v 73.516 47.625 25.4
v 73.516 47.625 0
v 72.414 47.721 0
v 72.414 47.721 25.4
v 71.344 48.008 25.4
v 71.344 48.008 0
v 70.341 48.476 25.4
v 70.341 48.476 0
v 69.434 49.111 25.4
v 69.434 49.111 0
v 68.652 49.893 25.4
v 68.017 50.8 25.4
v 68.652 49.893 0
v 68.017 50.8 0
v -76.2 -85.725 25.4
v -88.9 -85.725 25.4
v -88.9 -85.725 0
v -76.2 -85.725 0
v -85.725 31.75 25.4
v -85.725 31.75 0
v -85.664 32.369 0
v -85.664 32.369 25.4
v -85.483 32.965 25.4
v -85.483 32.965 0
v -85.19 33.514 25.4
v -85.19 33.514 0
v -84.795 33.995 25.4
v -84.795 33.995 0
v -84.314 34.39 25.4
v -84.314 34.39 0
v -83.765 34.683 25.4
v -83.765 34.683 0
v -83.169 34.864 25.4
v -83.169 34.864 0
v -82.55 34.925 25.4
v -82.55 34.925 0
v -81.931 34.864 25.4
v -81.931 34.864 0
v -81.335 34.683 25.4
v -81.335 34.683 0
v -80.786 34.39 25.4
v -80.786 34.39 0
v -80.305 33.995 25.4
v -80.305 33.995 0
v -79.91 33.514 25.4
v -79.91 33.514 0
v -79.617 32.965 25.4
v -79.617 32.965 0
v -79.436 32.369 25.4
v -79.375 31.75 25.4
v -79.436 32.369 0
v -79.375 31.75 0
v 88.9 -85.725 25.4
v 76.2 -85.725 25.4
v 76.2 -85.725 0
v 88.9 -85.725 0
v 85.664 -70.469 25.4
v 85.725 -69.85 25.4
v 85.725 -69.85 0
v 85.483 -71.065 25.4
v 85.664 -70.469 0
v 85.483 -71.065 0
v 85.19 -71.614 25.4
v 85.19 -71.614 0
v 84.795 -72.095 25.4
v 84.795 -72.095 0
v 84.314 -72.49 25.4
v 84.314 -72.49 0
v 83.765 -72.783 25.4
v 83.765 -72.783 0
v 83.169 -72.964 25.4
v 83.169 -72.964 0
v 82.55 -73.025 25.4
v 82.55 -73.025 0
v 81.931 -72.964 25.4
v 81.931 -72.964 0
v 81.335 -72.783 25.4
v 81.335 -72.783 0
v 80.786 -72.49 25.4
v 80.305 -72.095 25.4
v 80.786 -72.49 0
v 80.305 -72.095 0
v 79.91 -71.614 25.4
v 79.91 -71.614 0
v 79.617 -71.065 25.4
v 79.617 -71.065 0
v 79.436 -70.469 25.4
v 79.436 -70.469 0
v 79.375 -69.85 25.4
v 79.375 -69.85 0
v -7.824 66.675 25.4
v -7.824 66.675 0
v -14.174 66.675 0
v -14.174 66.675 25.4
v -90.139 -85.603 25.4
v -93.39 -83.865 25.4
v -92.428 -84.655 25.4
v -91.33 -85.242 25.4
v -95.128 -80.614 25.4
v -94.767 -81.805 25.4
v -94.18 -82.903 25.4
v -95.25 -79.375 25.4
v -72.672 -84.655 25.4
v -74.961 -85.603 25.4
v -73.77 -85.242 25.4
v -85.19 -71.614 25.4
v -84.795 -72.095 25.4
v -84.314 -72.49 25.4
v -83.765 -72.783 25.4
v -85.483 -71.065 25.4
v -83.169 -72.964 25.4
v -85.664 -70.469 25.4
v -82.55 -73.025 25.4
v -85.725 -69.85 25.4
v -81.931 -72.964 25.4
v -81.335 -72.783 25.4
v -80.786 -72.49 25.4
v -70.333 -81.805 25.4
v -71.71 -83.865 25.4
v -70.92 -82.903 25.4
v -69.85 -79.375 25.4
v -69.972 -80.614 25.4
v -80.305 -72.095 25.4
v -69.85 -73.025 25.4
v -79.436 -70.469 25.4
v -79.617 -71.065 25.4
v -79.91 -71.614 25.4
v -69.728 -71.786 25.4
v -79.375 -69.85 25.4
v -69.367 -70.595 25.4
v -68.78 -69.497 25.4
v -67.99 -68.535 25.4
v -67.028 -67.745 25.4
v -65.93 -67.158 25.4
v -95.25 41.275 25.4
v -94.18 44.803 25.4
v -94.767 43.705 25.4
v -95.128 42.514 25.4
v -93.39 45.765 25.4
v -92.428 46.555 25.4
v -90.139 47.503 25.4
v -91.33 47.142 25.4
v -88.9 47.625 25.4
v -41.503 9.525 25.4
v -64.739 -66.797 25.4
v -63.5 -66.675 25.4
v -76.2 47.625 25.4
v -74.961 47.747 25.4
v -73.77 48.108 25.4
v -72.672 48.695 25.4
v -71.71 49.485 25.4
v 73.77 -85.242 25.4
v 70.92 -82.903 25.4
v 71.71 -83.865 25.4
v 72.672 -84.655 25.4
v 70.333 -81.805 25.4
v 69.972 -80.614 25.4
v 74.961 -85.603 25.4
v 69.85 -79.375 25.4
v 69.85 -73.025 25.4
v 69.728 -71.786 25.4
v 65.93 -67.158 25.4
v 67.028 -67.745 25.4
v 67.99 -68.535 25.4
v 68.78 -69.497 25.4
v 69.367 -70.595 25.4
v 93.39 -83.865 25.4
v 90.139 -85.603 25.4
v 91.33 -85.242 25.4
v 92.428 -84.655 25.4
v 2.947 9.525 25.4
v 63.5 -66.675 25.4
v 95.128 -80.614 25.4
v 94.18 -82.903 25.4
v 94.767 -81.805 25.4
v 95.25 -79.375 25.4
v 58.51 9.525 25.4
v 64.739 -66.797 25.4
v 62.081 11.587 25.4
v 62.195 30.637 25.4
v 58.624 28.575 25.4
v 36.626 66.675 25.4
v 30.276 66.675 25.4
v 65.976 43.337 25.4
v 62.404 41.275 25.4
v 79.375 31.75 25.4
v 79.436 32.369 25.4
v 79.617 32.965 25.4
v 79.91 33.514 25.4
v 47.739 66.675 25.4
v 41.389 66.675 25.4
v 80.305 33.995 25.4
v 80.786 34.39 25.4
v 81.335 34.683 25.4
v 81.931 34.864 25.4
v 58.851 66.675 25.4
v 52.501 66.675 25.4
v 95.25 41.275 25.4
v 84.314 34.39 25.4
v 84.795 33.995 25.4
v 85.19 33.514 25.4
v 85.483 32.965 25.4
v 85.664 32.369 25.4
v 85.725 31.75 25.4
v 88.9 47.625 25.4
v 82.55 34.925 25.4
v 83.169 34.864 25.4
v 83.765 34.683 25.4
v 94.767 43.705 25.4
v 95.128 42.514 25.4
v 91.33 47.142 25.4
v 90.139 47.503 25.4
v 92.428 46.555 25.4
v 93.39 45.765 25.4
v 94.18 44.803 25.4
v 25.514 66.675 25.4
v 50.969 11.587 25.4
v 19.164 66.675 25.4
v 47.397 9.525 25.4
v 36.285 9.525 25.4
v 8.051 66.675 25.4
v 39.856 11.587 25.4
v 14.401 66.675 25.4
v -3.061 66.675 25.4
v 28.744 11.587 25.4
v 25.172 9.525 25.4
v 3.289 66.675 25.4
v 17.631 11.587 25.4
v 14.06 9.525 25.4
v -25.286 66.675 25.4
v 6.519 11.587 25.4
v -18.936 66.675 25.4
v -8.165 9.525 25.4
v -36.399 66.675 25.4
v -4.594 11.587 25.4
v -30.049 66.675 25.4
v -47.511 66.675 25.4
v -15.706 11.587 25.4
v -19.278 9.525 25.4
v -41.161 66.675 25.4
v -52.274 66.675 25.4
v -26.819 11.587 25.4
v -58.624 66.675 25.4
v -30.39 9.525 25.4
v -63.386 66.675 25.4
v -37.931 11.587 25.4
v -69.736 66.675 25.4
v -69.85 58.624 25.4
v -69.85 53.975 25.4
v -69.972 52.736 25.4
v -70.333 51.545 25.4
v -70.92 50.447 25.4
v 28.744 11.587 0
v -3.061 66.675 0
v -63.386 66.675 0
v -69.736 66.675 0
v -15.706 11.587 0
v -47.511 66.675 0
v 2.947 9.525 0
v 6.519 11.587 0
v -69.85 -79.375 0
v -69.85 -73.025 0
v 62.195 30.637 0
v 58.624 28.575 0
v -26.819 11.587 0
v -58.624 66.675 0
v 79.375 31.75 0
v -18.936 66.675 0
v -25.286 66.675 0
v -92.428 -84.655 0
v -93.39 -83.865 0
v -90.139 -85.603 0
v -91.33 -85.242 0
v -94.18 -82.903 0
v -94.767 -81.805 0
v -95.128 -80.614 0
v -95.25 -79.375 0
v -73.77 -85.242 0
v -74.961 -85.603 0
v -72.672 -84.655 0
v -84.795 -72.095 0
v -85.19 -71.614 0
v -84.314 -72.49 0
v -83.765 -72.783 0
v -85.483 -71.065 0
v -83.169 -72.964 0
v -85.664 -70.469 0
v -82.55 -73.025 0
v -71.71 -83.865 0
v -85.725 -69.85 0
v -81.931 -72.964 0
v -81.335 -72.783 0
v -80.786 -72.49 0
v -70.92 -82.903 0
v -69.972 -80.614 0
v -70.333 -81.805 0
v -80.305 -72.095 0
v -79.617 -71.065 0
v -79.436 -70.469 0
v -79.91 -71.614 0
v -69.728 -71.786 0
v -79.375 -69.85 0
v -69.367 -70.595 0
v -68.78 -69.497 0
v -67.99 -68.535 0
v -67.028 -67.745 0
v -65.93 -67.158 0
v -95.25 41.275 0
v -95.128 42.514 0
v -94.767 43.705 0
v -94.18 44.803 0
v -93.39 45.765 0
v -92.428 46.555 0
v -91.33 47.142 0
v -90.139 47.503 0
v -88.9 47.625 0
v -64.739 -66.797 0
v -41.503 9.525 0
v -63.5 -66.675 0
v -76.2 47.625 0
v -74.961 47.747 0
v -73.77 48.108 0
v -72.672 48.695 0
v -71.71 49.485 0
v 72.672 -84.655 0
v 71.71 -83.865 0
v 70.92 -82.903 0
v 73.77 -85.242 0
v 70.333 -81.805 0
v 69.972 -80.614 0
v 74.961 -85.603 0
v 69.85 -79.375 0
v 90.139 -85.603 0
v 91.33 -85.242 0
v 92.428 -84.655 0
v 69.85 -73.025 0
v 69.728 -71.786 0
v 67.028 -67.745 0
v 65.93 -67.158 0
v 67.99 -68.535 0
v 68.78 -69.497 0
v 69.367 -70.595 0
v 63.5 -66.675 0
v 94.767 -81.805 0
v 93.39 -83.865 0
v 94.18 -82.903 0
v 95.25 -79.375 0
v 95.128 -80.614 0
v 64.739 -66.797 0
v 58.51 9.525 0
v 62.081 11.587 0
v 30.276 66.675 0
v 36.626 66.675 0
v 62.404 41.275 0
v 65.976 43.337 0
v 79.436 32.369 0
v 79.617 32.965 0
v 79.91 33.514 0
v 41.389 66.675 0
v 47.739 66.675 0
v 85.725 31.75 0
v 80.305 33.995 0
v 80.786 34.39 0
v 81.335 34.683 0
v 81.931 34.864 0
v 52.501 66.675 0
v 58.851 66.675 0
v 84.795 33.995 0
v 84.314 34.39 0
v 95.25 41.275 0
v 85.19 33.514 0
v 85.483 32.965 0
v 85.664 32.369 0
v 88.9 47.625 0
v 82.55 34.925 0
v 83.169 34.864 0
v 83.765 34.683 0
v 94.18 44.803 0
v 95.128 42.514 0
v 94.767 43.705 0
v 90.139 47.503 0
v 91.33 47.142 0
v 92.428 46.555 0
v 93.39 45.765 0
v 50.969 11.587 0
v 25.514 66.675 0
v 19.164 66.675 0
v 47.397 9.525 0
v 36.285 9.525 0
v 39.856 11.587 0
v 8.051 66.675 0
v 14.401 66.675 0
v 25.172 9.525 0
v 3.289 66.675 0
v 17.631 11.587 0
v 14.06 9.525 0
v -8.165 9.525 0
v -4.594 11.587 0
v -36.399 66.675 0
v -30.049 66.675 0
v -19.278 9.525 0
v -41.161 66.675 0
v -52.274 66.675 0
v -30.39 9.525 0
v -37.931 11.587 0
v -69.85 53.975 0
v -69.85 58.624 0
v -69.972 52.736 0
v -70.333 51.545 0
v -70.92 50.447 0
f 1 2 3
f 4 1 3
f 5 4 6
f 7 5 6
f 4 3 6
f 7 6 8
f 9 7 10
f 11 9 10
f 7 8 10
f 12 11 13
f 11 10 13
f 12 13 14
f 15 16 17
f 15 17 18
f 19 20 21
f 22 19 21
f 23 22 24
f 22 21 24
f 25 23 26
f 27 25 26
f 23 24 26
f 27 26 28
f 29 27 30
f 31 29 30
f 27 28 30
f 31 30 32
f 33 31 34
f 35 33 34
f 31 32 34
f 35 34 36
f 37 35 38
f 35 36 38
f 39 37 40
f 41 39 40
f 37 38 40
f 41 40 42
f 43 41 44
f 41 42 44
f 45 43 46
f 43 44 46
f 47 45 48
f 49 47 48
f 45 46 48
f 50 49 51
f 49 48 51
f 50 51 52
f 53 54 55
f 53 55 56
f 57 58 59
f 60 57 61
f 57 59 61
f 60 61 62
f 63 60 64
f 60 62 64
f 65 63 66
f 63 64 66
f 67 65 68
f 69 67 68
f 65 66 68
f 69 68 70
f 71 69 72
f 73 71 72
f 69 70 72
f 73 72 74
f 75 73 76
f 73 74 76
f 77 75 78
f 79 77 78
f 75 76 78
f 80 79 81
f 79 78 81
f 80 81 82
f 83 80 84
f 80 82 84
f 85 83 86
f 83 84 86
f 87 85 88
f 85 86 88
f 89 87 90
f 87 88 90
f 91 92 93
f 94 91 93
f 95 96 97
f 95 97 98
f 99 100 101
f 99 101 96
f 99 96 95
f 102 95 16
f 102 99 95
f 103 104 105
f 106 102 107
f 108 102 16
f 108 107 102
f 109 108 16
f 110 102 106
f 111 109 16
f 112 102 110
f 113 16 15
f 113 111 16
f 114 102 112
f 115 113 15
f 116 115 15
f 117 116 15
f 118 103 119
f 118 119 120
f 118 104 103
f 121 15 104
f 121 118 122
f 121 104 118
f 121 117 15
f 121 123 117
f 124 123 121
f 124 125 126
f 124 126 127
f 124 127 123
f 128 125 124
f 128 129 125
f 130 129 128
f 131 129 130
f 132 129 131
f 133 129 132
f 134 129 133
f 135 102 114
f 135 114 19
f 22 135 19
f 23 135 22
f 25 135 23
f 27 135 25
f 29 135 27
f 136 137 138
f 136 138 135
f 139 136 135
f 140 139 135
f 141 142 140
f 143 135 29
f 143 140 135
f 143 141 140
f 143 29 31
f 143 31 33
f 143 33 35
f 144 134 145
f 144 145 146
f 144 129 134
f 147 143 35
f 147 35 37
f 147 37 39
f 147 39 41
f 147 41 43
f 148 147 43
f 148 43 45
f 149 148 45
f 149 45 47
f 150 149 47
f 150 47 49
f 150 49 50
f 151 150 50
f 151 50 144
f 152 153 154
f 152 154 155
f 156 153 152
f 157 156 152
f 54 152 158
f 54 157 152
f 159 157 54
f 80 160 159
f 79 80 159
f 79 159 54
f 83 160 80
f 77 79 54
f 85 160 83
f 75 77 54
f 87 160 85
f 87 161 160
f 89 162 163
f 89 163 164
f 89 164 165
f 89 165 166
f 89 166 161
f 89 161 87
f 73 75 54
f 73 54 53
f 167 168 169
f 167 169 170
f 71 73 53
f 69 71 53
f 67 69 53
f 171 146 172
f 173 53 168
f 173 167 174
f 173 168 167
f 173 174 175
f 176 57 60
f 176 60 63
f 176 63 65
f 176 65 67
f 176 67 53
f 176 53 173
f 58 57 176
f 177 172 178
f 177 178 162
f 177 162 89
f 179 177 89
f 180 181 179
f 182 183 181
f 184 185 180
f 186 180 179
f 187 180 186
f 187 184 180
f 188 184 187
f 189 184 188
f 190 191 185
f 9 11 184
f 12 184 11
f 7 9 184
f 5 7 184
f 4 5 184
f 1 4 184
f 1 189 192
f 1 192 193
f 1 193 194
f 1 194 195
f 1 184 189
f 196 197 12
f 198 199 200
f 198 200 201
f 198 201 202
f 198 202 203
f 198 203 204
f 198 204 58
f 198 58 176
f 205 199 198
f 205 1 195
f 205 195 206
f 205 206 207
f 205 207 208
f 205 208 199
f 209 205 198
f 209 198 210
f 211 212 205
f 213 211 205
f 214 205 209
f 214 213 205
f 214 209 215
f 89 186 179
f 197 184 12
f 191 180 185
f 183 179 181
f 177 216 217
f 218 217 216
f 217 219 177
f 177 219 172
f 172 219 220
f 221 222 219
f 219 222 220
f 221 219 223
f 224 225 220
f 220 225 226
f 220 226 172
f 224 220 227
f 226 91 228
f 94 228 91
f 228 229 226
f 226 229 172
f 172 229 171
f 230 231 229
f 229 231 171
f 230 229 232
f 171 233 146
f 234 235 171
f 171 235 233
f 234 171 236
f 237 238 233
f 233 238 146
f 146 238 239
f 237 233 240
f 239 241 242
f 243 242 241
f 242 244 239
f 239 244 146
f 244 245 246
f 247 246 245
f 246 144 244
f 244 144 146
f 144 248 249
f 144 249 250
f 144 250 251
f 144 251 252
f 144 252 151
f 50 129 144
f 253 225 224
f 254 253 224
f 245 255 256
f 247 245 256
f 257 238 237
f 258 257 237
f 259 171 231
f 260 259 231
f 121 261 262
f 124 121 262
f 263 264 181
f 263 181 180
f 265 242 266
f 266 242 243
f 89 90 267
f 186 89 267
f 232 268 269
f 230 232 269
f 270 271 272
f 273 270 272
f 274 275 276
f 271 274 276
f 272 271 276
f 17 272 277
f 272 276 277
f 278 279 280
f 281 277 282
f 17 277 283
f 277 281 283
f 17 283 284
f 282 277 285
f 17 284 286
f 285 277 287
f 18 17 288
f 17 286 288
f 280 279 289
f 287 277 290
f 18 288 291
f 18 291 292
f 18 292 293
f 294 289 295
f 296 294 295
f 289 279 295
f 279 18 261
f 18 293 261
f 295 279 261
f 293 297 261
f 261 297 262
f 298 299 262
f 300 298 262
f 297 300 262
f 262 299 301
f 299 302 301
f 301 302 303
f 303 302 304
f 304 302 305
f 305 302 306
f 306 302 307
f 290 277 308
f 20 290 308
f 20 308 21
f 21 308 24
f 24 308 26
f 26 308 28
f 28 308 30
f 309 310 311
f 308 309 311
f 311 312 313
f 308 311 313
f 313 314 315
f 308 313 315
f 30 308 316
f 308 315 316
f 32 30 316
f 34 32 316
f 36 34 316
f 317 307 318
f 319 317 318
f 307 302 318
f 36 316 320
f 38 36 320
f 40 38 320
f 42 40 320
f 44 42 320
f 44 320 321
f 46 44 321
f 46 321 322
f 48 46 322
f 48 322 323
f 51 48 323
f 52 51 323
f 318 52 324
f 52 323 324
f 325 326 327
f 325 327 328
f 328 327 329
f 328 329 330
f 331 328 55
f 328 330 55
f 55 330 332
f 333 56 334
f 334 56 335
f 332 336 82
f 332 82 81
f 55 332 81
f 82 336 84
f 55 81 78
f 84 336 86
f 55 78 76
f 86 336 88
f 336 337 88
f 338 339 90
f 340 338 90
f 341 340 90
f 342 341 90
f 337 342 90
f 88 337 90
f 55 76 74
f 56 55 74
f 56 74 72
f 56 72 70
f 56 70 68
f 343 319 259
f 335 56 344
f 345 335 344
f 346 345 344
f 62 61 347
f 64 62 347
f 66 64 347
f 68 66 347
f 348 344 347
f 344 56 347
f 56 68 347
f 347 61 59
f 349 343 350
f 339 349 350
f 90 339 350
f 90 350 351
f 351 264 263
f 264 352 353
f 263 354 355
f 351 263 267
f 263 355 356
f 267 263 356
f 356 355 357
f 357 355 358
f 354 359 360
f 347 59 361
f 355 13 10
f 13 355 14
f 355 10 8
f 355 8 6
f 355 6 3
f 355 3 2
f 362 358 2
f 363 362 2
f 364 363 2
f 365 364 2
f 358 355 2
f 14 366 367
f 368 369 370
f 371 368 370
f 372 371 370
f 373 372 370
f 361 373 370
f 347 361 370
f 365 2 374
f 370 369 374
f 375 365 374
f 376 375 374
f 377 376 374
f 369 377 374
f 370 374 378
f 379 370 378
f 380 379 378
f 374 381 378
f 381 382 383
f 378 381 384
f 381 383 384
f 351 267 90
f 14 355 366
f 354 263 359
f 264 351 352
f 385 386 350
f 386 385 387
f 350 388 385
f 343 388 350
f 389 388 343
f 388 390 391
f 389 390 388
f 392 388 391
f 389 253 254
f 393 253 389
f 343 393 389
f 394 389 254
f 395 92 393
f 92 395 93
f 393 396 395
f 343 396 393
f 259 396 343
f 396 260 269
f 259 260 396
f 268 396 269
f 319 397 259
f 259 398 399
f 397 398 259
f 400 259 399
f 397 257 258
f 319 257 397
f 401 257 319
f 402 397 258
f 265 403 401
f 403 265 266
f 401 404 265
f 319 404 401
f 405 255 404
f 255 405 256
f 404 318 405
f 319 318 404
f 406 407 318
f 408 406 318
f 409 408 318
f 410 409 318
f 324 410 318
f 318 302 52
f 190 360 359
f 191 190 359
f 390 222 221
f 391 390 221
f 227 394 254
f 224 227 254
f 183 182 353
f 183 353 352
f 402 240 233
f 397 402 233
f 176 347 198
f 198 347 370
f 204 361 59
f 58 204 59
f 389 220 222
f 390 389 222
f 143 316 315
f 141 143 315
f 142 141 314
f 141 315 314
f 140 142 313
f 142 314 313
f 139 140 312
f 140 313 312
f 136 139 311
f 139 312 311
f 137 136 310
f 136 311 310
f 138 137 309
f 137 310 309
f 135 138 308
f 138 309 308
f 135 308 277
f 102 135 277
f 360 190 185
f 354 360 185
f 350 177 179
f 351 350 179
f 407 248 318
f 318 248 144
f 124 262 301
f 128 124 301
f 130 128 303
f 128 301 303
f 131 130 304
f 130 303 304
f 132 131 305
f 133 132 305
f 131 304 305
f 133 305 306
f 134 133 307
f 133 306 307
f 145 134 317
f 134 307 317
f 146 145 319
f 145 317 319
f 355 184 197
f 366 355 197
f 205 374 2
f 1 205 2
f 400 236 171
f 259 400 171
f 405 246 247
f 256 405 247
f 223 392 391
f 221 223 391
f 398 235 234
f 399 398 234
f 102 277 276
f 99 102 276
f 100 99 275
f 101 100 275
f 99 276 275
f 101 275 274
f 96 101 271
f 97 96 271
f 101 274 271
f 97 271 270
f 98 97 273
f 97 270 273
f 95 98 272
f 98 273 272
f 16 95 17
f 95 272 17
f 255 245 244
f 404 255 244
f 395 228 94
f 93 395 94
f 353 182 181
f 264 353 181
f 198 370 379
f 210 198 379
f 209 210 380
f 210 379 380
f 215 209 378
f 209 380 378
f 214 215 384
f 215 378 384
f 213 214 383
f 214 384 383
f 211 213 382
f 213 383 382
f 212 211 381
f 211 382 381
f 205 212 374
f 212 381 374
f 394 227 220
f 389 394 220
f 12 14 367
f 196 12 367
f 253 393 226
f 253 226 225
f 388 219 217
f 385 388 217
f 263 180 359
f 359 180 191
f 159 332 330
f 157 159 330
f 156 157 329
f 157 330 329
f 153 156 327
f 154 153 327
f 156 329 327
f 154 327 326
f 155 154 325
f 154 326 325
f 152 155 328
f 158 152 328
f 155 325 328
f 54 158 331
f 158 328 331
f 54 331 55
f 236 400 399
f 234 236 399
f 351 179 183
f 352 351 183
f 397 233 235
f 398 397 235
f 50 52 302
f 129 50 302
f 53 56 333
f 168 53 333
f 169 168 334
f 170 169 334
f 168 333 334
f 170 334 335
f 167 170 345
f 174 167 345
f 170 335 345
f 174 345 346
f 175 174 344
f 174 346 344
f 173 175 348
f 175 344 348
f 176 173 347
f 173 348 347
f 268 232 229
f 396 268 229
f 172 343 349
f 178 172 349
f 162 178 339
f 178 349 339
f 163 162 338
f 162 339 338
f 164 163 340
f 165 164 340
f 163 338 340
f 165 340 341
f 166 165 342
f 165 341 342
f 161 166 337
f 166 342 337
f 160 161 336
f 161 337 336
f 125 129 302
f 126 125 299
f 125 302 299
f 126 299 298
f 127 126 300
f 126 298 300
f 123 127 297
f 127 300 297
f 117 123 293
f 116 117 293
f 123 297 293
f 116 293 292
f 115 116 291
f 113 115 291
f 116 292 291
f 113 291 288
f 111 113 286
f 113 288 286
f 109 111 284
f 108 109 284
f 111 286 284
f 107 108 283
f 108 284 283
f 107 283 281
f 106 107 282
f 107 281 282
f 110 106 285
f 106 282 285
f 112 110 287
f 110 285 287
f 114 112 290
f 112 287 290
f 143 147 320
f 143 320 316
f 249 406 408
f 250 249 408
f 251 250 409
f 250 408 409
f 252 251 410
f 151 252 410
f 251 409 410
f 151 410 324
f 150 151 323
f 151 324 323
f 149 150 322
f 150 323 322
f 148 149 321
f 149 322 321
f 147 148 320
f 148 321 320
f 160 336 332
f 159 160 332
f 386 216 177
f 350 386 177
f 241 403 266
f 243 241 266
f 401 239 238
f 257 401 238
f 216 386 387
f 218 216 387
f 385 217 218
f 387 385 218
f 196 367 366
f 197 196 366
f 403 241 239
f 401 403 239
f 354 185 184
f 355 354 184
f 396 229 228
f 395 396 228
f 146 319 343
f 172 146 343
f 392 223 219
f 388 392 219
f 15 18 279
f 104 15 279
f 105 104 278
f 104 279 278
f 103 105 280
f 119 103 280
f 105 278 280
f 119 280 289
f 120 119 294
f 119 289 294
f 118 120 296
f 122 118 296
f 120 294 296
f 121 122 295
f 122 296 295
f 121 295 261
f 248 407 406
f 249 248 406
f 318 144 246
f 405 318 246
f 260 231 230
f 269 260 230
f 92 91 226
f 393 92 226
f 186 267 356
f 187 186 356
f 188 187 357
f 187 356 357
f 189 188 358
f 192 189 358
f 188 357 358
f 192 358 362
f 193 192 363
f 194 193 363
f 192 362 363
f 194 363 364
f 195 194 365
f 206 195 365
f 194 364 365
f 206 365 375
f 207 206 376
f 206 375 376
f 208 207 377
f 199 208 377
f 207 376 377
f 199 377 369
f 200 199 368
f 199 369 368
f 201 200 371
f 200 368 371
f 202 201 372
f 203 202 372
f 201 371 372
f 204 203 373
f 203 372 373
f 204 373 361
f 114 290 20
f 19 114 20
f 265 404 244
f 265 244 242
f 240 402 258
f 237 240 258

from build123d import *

# Parameters (mm, degrees)
F1_DEPTH = 25.4
F3_DEPTH = 25.401
F5_DEPTH = 25.401


with BuildPart() as f1:
    # F0 (on Top) → F1 (new body)
    with BuildSketch(Plane.XY):
        with BuildLine():
            Line((58.851477, 66.675), (0, 66.675))
            Line((0, 66.675), (-69.85, 66.675))
            Line((-69.85, 66.675), (-69.85, 53.975))
            ThreePointArc((-69.85, 53.975), (-71.709872, 49.484872), (-76.2, 47.625))
            Line((-76.2, 47.625), (-88.9, 47.625))
            ThreePointArc((-88.9, 47.625), (-93.390128, 45.765128), (-95.25, 41.275))
            Line((-95.25, 41.275), (-95.25, -79.375))
            ThreePointArc((-95.25, -79.375), (-93.390128, -83.865128), (-88.9, -85.725))
            Line((-88.9, -85.725), (-76.2, -85.725))
            ThreePointArc((-76.2, -85.725), (-71.709872, -83.865128), (-69.85, -79.375))
            Line((-69.85, -79.375), (-69.85, -73.025))
            ThreePointArc((-69.85, -73.025), (-67.990128, -68.534872), (-63.5, -66.675))
            Line((-63.5, -66.675), (0, -66.675))
            Line((0, -66.675), (63.5, -66.675))
            ThreePointArc((63.5, -66.675), (67.990128, -68.534872), (69.85, -73.025))
            Line((69.85, -73.025), (69.85, -79.375))
            ThreePointArc((69.85, -79.375), (71.709872, -83.865128), (76.2, -85.725))
            Line((76.2, -85.725), (88.9, -85.725))
            ThreePointArc((88.9, -85.725), (93.390128, -83.865128), (95.25, -79.375))
            Line((95.25, -79.375), (95.25, 41.275))
            ThreePointArc((95.25, 41.275), (93.390128, 45.765128), (88.9, 47.625))
            Line((88.9, 47.625), (73.516174, 47.625))
            ThreePointArc((73.516174, 47.625), (70.341174, 48.475739), (68.016913, 50.8))
            Line((68.016913, 50.8), (58.851477, 66.675))
        make_face()
        with BuildLine():
            ThreePointArc((-85.725, 31.75), (-82.55, 34.925), (-79.375, 31.75))
            Line((-79.375, 31.75), (-79.375, -69.85))
            ThreePointArc((-79.375, -69.85), (-82.55, -73.025), (-85.725, -69.85))
            Line((-85.725, -69.85), (-85.725, 31.75))
        make_face(mode=Mode.SUBTRACT)
        with BuildLine():
            Line((79.375, -69.85), (79.375, 31.75))
            ThreePointArc((79.375, 31.75), (82.55, 34.925), (85.725, 31.75))
            Line((85.725, 31.75), (85.725, -69.85))
            ThreePointArc((85.725, -69.85), (82.55, -73.025), (79.375, -69.85))
        make_face(mode=Mode.SUBTRACT)
    extrude(amount=F1_DEPTH)

    # F2 (on face) → F3 (cut, through all)
    with BuildSketch(Plane.XY.offset(25.4)):
        Polygon((65.975549, 43.337223), (52.501477, 66.675), (47.738977, 66.675), (62.403674, 41.275), align=None)
    extrude(amount=-F3_DEPTH, mode=Mode.SUBTRACT)

    # F4 (on face) → F5 (cut, through all)
    with BuildSketch(Plane.XY.offset(25.4)):
        Polygon((62.195398, 30.637223), (41.388977, 66.675), (36.626477, 66.675), (58.623523, 28.575), align=None)
        Polygon((62.08142, 11.587223), (30.276477, 66.675), (25.513977, 66.675), (58.509545, 9.525), align=None)
        Polygon((19.163977, 66.675), (14.401477, 66.675), (47.397045, 9.525), (50.96892, 11.587223), align=None)
        Polygon((8.051477, 66.675), (3.288977, 66.675), (36.284545, 9.525), (39.85642, 11.587223), align=None)
        Polygon((-3.061023, 66.675), (-7.823523, 66.675), (25.172045, 9.525), (28.74392, 11.587223), align=None)
        Polygon((-14.173523, 66.675), (-18.936023, 66.675), (14.059545, 9.525), (17.63142, 11.587223), align=None)
        Polygon((-25.286023, 66.675), (-30.048523, 66.675), (2.947045, 9.525), (6.51892, 11.587223), align=None)
        Polygon((-36.398523, 66.675), (-41.161023, 66.675), (-8.165455, 9.525), (-4.59358, 11.587223), align=None)
        Polygon((-47.511023, 66.675), (-52.273523, 66.675), (-19.277955, 9.525), (-15.70608, 11.587223), align=None)
        Polygon((-58.623523, 66.675), (-63.386023, 66.675), (-30.390455, 9.525), (-26.81858, 11.587223), align=None)
        Polygon((-69.736023, 66.675), (-74.498523, 66.675), (-41.502955, 9.525), (-37.93108, 11.587223), align=None)
    extrude(amount=-F5_DEPTH, mode=Mode.SUBTRACT)


solid = f1.part
